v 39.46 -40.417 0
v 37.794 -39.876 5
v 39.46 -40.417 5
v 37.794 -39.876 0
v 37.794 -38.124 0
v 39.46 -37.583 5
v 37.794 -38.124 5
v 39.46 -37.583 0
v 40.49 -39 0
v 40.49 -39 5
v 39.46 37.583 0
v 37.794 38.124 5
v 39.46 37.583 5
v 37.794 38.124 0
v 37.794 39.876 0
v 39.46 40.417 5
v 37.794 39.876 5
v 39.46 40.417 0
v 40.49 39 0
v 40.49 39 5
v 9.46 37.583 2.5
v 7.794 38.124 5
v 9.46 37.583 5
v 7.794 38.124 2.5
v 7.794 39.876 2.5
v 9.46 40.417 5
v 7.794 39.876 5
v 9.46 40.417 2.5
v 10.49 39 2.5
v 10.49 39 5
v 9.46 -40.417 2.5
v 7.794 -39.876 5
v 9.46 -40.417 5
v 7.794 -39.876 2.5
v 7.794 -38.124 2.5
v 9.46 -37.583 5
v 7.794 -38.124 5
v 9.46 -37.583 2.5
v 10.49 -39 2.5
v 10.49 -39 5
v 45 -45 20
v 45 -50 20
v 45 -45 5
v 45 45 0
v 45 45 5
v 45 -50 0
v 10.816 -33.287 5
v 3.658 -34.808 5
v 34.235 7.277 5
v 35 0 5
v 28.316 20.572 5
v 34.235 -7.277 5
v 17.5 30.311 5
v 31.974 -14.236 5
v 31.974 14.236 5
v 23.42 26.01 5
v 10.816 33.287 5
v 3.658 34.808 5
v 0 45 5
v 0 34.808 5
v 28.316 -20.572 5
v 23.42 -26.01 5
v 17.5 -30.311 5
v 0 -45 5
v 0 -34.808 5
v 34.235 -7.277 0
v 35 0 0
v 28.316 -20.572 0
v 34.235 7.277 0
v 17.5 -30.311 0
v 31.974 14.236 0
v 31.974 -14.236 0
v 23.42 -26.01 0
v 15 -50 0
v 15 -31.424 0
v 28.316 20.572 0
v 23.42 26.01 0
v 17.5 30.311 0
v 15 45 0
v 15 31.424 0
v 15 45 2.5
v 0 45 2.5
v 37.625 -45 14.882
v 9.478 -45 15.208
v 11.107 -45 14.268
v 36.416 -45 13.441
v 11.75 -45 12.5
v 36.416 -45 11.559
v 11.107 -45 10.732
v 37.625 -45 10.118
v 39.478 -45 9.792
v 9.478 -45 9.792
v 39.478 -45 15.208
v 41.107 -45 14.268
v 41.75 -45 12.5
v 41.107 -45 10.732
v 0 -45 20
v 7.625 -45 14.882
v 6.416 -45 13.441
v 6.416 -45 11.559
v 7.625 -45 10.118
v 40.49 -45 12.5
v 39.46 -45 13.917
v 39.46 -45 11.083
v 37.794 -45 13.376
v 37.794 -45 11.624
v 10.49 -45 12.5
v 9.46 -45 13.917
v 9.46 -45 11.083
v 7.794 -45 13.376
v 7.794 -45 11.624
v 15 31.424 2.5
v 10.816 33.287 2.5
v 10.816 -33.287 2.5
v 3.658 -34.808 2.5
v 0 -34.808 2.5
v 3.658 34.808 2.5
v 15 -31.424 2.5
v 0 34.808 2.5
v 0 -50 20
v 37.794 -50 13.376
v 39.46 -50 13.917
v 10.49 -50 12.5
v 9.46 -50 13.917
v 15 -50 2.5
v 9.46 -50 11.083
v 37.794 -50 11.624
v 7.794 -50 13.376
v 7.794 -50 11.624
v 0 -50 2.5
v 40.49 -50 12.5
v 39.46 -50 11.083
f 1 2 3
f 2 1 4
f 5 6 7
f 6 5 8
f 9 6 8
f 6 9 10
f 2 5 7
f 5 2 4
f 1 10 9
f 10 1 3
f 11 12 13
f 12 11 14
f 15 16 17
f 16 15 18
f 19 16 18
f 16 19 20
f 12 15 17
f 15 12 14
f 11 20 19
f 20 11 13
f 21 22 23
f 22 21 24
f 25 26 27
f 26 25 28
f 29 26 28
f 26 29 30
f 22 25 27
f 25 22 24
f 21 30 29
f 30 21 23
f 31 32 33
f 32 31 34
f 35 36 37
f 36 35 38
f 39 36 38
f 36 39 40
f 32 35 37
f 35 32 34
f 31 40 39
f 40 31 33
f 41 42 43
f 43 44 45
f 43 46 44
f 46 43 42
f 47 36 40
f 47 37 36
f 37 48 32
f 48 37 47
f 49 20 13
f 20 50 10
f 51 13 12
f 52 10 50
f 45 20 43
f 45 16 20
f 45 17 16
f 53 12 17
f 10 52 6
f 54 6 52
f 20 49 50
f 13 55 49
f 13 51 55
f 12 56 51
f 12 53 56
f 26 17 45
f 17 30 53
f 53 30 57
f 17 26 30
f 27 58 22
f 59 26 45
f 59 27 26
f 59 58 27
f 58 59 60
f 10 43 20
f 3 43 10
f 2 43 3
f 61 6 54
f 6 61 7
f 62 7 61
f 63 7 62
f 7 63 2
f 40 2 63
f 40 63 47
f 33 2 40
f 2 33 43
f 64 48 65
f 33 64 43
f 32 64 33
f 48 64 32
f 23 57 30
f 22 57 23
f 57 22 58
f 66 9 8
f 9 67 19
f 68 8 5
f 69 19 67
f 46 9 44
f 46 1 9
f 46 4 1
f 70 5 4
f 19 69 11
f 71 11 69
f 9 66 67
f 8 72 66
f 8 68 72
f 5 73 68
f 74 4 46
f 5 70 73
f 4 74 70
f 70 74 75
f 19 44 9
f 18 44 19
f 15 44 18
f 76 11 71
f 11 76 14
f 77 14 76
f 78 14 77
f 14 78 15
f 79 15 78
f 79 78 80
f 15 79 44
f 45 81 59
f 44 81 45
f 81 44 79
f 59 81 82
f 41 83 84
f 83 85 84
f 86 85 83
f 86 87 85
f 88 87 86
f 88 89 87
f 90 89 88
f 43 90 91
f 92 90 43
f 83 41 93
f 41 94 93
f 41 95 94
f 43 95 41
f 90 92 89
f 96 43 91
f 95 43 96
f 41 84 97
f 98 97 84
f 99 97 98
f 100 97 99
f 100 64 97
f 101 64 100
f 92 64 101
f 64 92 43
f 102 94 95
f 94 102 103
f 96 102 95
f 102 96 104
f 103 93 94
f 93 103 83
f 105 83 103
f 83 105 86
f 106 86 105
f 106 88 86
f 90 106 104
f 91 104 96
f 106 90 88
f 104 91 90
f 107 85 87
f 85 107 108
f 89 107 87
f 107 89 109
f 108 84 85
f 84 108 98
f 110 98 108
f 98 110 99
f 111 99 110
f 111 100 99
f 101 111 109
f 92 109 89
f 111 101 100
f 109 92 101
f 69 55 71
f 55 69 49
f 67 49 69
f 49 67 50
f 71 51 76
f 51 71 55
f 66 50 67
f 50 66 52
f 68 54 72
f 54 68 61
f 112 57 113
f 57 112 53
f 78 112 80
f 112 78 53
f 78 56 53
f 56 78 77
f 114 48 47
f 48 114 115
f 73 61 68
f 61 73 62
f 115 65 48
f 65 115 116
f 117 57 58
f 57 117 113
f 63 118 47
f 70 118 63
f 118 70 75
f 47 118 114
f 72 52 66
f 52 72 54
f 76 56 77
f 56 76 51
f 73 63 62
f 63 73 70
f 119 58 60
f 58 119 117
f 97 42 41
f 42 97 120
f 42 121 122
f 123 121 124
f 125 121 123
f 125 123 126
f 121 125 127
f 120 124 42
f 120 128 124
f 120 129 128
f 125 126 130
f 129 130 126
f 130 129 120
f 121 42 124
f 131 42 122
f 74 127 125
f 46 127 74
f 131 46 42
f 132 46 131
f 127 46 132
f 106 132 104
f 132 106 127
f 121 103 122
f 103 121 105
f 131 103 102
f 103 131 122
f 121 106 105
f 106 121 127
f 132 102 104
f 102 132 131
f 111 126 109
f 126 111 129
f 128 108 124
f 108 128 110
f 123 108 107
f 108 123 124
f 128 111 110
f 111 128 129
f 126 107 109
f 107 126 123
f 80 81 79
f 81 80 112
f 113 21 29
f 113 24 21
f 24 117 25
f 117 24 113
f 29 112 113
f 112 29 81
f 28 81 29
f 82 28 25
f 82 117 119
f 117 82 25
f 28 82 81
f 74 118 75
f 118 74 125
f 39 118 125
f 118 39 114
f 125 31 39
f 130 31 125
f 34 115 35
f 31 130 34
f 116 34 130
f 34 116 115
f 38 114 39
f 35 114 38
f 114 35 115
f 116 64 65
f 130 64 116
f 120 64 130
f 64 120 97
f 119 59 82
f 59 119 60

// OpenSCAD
// file: lerdgemount.scad
use <MCAD/nuts_and_bolts.scad>;

module bolt(thesize,thelength)
{
 boltHole(thesize+.2,length=thelength);   
 %boltHole(thesize+.2,length=thelength);   
}
module board()
{
      difference(){
         translate([-45,-45,0]) cube([90,90,5]);  
         translate([-45+6,-45+6,-5]) bolt(3,12);
         translate([ 45-6,-45+6,-5]) bolt(3,12);
         translate([-45+6, 45-6,-5]) bolt(3,12);
         translate([ 45-6, 45-6,-5]) bolt(3,12); 
         translate([0,0,-5]) cylinder(r=35,h=20);      
         translate([-15+6, 45-6,-5]) bolt(3,12);
         translate([ 15-6, 45-6,-5]) bolt(3,12);  
         translate([-15+6, -45+6,-5]) bolt(3,12);
         translate([ 15-6, -45+6,-5]) bolt(3,12);   
         }
}

module mount()
{
    translate([-45,-45-5,0]) cube([90,5,15+5]);
    
}

module themount()
{
  board();
  mount();
}

module assembly()
{
    difference(){
        themount();
        translate([-15, 45-15,0])  cube([30,15,2.5]);
        translate([-15,-45-10,0])  cube([30,15+10,2.5]);
         translate([-45+6, -45, 5+7.5]) rotate([90,0,0])  bolt(3,12);
         translate([ 45-6, -45, 5+7.5]) rotate([90,0,0])  bolt(3,12);  
         translate([-15+6, -45, 5+7.5]) rotate([90,0,0]) bolt(3,12);
         translate([ 15-6, -45, 5+7.5]) rotate([90,0,0]) bolt(3,12);   
        }
}
// main file
use <lerdgemount.scad>;


module part2()
{
    difference(){
      assembly();
      translate([-45.1,-45-6,-.1]) cube([45.1,97,22]); 
      }
}    

part2();
